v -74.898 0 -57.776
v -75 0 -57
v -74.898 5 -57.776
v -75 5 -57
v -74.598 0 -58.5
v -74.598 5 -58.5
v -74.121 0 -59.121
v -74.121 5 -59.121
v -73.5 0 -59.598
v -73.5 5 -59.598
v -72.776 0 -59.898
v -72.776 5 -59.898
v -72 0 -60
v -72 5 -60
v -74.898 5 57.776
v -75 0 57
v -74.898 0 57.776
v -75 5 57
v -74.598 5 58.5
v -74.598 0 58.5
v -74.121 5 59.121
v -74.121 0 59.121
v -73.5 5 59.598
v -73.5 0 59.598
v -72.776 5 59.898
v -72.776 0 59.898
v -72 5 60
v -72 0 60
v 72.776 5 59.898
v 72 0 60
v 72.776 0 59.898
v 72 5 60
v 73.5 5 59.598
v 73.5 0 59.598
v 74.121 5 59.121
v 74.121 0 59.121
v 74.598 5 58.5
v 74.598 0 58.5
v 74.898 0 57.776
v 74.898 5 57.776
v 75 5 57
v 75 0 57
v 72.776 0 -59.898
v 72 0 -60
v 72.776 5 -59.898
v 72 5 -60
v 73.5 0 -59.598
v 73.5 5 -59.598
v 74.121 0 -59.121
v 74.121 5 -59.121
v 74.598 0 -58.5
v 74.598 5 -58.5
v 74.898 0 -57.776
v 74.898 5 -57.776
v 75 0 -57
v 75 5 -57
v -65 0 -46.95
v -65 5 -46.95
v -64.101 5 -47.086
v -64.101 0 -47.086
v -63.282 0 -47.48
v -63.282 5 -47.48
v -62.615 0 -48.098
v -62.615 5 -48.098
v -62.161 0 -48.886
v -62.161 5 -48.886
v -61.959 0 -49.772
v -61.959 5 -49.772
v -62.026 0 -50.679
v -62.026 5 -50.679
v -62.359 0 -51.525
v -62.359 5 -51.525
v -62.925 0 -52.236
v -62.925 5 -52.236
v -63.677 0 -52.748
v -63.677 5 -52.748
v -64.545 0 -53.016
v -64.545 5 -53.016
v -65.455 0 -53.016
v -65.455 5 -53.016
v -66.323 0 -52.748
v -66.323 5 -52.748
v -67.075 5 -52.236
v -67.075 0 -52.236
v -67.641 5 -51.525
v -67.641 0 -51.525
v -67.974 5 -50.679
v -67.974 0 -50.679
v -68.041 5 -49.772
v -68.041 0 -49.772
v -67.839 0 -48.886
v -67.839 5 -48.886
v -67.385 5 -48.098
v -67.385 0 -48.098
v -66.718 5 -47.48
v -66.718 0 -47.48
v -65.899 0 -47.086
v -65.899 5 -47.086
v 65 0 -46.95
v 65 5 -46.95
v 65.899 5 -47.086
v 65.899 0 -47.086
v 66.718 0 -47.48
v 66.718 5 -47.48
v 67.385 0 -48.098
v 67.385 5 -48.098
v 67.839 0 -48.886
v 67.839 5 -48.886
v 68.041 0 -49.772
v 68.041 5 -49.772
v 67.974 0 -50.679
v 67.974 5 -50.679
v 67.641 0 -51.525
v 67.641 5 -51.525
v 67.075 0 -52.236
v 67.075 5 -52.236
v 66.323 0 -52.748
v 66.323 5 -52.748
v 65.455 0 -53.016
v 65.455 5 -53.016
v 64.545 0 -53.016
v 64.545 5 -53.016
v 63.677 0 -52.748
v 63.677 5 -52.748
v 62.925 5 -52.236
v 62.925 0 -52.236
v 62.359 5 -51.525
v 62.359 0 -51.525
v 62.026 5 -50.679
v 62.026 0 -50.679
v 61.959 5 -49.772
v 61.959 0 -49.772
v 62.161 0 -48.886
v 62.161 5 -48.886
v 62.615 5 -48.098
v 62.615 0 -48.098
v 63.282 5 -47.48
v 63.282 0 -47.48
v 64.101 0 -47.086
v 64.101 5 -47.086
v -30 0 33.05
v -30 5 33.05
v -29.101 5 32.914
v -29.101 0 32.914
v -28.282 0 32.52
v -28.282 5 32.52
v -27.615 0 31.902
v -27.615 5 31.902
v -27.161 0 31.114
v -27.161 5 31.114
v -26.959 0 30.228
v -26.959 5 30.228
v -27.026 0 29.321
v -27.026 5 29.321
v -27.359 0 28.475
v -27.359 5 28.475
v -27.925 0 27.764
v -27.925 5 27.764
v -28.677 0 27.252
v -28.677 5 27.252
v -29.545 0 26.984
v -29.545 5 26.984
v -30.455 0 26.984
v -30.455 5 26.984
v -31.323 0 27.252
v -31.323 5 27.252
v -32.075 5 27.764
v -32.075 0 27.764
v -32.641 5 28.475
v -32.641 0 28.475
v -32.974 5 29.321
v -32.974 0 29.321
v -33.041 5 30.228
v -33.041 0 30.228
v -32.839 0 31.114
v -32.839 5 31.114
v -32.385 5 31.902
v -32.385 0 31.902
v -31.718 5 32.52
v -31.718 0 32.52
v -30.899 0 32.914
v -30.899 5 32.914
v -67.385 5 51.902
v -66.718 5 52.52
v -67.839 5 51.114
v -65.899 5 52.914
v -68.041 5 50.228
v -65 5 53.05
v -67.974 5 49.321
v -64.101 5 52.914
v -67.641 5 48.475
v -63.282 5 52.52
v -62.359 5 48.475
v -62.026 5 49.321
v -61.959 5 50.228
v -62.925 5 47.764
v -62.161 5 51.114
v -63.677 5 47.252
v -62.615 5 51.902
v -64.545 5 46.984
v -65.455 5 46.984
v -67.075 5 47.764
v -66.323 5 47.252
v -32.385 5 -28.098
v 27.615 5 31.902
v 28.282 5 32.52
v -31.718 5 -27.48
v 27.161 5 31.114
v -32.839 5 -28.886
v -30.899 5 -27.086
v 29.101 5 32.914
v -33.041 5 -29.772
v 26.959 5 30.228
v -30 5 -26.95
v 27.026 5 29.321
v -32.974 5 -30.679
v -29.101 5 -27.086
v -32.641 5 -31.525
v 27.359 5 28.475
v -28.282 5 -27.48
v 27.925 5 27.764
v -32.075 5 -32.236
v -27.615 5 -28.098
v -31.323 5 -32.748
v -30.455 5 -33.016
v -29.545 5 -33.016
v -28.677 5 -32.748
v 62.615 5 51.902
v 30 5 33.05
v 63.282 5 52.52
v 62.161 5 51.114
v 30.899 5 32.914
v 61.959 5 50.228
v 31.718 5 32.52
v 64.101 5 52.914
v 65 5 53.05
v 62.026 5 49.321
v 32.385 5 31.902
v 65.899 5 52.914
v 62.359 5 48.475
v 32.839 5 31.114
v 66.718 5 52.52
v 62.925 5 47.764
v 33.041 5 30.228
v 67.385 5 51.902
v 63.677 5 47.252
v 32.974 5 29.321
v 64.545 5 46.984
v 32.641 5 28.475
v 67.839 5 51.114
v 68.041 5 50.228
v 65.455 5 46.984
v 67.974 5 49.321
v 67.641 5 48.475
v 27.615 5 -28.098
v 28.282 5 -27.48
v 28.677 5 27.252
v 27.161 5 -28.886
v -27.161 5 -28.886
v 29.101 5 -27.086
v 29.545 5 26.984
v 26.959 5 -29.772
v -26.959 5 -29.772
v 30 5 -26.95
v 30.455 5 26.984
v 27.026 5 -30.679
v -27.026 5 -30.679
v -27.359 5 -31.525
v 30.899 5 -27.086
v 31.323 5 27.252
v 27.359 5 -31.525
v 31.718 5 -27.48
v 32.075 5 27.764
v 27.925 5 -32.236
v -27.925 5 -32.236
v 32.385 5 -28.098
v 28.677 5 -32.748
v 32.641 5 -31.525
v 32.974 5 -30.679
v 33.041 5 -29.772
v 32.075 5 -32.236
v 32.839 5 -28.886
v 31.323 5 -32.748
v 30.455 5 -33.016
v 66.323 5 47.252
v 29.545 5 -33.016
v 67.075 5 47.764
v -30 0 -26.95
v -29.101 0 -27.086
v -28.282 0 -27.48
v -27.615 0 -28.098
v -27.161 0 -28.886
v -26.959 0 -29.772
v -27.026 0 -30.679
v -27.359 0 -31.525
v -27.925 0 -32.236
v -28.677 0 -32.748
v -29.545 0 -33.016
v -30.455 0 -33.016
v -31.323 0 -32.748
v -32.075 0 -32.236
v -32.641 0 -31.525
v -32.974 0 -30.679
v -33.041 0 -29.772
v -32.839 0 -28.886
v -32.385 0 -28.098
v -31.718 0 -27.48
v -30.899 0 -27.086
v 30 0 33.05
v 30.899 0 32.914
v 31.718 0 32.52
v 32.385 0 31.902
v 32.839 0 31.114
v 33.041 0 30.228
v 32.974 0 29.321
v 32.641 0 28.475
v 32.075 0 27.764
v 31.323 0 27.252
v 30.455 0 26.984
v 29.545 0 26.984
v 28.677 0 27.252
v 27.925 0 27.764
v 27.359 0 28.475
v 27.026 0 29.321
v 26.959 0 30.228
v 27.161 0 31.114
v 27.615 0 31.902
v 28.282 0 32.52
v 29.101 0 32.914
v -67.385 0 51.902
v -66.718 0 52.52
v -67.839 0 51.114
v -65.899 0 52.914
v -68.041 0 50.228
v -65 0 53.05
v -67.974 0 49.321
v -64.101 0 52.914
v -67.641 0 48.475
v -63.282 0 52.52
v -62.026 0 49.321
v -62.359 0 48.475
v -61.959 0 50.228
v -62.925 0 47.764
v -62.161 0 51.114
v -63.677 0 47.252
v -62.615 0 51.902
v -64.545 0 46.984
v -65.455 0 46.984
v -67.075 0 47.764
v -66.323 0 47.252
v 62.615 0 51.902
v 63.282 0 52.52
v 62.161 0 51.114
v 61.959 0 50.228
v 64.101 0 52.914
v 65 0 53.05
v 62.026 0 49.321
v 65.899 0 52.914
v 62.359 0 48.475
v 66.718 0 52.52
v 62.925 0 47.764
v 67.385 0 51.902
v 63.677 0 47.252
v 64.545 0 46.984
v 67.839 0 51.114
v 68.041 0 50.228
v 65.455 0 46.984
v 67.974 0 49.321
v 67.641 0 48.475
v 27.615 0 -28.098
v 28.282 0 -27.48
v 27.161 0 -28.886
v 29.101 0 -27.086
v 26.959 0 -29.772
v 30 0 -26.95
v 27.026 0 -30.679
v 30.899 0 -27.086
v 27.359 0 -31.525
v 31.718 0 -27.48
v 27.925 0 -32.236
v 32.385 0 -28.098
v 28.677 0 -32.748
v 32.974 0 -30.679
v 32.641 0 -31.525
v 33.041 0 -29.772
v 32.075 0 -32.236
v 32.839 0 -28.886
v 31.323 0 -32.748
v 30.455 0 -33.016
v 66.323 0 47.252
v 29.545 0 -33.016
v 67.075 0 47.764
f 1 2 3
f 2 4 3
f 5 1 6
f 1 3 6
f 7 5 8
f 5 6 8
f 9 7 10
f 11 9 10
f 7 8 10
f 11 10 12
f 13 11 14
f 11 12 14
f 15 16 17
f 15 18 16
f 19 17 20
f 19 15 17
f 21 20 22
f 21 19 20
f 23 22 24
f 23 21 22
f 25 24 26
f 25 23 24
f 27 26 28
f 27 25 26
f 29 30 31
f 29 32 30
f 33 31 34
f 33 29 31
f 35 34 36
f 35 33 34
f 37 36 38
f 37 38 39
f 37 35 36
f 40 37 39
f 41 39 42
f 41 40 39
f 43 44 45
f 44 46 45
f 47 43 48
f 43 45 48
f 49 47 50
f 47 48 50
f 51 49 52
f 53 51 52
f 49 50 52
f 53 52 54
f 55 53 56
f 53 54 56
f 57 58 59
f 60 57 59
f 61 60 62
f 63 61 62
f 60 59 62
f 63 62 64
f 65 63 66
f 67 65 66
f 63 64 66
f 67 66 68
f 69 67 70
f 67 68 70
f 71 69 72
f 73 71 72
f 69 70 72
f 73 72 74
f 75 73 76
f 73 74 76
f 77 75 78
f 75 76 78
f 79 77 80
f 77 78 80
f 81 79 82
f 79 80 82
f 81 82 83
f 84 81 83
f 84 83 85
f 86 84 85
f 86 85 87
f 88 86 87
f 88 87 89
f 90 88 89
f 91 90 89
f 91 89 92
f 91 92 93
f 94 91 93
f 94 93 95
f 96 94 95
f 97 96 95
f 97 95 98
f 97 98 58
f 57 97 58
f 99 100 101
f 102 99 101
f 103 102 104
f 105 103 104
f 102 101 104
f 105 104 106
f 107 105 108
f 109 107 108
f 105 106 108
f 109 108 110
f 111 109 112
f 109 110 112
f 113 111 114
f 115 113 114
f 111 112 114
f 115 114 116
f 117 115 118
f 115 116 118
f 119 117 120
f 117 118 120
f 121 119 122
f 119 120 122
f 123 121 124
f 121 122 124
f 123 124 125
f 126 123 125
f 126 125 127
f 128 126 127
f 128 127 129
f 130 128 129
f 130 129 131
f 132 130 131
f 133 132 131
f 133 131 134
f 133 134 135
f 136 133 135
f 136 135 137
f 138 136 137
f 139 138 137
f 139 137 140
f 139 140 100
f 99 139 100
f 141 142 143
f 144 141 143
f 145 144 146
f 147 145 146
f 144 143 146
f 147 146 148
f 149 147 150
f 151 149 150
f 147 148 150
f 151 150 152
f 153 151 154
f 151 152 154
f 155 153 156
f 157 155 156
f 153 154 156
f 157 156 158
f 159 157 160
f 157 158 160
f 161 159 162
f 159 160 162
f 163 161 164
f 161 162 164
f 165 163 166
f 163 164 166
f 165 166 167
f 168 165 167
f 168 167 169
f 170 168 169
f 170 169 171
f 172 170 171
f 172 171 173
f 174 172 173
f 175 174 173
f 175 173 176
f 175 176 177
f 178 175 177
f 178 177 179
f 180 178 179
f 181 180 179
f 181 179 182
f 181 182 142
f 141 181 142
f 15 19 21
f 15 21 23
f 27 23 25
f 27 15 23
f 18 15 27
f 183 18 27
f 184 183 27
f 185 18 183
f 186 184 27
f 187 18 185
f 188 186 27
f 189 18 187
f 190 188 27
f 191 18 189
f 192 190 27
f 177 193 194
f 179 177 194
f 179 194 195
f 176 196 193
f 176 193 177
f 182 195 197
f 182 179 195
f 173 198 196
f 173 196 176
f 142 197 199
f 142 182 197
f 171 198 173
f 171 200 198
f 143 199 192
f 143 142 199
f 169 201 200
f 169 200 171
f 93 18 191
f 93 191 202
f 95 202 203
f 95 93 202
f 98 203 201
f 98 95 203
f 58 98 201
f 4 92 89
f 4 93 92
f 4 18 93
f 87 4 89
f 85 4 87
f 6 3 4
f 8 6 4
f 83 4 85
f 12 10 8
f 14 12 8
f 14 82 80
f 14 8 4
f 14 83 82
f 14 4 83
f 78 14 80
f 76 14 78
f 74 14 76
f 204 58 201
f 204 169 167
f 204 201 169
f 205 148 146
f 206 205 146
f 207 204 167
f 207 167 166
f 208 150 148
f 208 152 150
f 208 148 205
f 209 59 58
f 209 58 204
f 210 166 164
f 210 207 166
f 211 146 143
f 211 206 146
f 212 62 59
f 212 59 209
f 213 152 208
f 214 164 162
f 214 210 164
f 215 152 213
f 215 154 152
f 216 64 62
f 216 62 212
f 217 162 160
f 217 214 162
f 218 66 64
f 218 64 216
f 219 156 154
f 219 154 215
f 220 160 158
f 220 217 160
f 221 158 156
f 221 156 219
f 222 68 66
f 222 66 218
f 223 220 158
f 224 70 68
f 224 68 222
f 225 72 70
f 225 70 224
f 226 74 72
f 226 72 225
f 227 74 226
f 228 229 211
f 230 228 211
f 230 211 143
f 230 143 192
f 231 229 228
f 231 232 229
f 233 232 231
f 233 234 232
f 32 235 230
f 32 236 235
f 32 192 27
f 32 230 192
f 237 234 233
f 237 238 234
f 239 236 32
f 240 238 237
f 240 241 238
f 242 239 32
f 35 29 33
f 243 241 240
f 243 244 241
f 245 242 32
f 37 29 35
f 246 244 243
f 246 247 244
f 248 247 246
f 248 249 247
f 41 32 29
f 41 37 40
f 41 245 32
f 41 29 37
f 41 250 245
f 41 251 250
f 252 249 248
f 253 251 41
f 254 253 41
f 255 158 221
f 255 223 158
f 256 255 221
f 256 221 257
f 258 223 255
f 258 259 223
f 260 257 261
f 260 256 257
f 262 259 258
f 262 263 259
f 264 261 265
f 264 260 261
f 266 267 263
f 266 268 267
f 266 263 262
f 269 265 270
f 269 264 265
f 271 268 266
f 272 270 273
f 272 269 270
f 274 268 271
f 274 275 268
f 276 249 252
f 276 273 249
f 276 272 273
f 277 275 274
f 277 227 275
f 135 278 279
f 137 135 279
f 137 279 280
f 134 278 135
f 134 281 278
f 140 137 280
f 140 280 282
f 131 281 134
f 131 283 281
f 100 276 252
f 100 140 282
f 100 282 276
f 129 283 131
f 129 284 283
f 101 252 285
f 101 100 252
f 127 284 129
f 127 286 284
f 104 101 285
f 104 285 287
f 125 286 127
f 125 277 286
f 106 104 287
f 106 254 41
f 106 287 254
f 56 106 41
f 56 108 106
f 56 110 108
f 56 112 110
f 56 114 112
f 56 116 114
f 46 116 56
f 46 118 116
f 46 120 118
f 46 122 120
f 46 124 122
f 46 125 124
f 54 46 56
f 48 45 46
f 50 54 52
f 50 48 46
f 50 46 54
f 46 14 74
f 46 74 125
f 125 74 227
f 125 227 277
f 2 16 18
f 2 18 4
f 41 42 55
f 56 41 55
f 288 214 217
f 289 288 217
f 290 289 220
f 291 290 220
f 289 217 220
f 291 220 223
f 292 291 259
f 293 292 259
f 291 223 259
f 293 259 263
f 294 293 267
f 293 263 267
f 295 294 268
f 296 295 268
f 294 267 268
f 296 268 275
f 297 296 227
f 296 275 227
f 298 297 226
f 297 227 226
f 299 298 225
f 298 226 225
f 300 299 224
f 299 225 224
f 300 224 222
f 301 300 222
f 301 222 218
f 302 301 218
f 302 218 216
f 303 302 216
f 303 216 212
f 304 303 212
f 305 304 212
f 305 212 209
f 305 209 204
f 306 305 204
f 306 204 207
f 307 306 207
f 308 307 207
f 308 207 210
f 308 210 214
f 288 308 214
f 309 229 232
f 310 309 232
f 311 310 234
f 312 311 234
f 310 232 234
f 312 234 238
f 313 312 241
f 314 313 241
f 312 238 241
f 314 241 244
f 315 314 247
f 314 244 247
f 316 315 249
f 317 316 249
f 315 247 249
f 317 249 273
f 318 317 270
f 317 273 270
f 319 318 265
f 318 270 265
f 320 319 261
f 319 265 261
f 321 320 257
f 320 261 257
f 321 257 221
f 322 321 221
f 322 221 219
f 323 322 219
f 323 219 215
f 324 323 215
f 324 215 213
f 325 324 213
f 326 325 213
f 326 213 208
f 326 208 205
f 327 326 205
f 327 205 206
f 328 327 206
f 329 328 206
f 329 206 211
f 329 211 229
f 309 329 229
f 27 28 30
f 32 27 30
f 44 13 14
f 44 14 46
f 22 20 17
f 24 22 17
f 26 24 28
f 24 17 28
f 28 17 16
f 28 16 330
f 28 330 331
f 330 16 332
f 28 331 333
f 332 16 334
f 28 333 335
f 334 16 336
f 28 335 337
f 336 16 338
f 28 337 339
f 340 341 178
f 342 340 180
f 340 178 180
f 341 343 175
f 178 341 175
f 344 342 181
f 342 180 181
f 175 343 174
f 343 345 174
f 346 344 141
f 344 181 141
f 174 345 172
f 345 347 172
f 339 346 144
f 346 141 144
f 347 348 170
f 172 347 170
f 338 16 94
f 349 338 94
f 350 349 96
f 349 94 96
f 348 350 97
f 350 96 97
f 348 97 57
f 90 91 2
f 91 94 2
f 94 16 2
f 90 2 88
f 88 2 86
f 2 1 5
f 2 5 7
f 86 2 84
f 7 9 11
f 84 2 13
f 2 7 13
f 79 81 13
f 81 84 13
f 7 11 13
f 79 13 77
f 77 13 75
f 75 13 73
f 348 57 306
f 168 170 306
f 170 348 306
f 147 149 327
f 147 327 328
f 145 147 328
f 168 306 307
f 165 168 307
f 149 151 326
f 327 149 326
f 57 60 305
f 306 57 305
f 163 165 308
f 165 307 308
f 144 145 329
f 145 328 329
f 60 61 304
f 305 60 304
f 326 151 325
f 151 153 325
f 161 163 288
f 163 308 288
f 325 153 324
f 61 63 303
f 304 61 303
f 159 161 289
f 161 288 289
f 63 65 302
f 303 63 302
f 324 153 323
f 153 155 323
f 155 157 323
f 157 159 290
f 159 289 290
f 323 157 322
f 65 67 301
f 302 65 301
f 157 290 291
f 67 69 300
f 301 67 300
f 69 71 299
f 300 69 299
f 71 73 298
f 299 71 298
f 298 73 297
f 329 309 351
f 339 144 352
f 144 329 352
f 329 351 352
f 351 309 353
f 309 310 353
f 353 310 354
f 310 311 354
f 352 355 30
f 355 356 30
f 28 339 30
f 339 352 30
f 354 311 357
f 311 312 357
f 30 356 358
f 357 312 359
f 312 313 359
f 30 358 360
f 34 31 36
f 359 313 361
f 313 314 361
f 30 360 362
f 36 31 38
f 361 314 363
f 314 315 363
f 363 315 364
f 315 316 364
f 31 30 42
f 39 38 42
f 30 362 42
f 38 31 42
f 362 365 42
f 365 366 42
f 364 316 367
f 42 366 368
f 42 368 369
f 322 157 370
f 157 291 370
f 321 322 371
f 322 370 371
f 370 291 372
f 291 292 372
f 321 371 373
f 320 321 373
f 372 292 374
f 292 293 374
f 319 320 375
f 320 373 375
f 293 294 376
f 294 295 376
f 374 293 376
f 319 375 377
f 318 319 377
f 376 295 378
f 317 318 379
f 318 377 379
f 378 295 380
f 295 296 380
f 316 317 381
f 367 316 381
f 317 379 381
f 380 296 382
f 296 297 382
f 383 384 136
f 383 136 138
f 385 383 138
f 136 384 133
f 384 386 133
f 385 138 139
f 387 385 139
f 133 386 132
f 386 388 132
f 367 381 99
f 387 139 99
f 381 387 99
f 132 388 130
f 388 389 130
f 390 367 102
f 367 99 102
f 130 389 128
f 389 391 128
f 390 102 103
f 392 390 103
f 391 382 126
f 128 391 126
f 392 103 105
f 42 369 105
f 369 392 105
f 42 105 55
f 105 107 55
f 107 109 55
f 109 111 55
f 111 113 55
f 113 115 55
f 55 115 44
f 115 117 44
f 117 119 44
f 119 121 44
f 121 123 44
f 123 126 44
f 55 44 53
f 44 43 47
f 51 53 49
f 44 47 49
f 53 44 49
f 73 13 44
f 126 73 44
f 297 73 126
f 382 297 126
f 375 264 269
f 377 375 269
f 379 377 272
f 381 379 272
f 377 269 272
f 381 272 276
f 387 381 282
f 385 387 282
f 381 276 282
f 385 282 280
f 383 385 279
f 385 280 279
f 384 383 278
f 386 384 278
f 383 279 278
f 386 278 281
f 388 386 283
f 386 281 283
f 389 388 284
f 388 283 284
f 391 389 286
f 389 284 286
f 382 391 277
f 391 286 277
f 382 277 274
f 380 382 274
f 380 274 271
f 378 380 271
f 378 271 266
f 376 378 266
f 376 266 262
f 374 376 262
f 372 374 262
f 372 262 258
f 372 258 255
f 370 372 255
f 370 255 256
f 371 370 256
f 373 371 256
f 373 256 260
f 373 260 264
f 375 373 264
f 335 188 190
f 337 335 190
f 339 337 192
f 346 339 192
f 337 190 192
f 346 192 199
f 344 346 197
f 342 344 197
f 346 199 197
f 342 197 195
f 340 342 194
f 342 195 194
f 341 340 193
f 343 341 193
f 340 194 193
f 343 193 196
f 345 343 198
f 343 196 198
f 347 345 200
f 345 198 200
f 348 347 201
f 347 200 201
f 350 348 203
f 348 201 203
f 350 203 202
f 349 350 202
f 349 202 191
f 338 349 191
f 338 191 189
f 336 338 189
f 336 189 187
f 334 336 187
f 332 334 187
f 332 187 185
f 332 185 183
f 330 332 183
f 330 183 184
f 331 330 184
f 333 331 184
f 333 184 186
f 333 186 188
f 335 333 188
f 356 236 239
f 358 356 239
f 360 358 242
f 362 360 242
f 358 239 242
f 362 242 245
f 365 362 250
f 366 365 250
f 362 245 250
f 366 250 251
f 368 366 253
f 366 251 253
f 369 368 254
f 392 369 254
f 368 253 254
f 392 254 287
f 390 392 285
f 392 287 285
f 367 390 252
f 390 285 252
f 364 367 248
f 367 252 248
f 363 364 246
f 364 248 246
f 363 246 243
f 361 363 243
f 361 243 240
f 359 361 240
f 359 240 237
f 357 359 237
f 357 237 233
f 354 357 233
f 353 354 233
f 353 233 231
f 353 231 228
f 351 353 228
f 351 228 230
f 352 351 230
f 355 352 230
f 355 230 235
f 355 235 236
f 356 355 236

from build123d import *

# Parameters (mm, degrees)
SKETCH1_W           = 150
SKETCH1_H           = 120
BOSS_EXTRUDE1_DEPTH = 5
SKETCH2_R           = 3.05
CUT_EXTRUDE1_DEPTH  = 10
FILLET1_R           = 3


with BuildPart() as part:
    # Sketch1 → Boss-Extrude1 (new body)
    with BuildSketch(Plane(origin=(0, 0, 0), x_dir=(1, 0, 0), z_dir=(0, 1, 0))):
        Rectangle(SKETCH1_W, SKETCH1_H)
    extrude(amount=BOSS_EXTRUDE1_DEPTH)

    # Sketch2 → Cut-Extrude1 (cut)
    with BuildSketch(Plane(origin=(0, 5, 0), x_dir=(1, 0, 0), z_dir=(0, 1, 0))):
        with Locations(Location((-30, 30, 0), (0, 0, 270))):
            Circle(SKETCH2_R)
        with Locations(Location((30, 30, 0), (0, 0, 270))):
            Circle(SKETCH2_R)
        with Locations(Location((30, -30, 0), (0, 0, 270))):
            Circle(SKETCH2_R)
        with Locations(Location((-30, -30, 0), (0, 0, 270))):
            Circle(SKETCH2_R)
        with Locations(Location((-65, 50, 0), (0, 0, 270))):
            Circle(SKETCH2_R)
        with Locations(Location((65, 50, 0), (0, 0, 270))):
            Circle(SKETCH2_R)
        with Locations(Location((-65, -50, 0), (0, 0, 270))):
            Circle(SKETCH2_R)
        with Locations(Location((65, -50, 0), (0, 0, 270))):
            Circle(SKETCH2_R)
    extrude(amount=-CUT_EXTRUDE1_DEPTH, mode=Mode.SUBTRACT)

    # Fillet1
    fillet1_edges = [part.edges().sort_by_distance(p)[0] for p in [
        (75, 2.5, 60),
        (-75, 2.5, 60),
        (-75, 2.5, -60),
        (75, 2.5, -60),
    ]]
    fillet(fillet1_edges, radius=FILLET1_R)


solid = part.part
